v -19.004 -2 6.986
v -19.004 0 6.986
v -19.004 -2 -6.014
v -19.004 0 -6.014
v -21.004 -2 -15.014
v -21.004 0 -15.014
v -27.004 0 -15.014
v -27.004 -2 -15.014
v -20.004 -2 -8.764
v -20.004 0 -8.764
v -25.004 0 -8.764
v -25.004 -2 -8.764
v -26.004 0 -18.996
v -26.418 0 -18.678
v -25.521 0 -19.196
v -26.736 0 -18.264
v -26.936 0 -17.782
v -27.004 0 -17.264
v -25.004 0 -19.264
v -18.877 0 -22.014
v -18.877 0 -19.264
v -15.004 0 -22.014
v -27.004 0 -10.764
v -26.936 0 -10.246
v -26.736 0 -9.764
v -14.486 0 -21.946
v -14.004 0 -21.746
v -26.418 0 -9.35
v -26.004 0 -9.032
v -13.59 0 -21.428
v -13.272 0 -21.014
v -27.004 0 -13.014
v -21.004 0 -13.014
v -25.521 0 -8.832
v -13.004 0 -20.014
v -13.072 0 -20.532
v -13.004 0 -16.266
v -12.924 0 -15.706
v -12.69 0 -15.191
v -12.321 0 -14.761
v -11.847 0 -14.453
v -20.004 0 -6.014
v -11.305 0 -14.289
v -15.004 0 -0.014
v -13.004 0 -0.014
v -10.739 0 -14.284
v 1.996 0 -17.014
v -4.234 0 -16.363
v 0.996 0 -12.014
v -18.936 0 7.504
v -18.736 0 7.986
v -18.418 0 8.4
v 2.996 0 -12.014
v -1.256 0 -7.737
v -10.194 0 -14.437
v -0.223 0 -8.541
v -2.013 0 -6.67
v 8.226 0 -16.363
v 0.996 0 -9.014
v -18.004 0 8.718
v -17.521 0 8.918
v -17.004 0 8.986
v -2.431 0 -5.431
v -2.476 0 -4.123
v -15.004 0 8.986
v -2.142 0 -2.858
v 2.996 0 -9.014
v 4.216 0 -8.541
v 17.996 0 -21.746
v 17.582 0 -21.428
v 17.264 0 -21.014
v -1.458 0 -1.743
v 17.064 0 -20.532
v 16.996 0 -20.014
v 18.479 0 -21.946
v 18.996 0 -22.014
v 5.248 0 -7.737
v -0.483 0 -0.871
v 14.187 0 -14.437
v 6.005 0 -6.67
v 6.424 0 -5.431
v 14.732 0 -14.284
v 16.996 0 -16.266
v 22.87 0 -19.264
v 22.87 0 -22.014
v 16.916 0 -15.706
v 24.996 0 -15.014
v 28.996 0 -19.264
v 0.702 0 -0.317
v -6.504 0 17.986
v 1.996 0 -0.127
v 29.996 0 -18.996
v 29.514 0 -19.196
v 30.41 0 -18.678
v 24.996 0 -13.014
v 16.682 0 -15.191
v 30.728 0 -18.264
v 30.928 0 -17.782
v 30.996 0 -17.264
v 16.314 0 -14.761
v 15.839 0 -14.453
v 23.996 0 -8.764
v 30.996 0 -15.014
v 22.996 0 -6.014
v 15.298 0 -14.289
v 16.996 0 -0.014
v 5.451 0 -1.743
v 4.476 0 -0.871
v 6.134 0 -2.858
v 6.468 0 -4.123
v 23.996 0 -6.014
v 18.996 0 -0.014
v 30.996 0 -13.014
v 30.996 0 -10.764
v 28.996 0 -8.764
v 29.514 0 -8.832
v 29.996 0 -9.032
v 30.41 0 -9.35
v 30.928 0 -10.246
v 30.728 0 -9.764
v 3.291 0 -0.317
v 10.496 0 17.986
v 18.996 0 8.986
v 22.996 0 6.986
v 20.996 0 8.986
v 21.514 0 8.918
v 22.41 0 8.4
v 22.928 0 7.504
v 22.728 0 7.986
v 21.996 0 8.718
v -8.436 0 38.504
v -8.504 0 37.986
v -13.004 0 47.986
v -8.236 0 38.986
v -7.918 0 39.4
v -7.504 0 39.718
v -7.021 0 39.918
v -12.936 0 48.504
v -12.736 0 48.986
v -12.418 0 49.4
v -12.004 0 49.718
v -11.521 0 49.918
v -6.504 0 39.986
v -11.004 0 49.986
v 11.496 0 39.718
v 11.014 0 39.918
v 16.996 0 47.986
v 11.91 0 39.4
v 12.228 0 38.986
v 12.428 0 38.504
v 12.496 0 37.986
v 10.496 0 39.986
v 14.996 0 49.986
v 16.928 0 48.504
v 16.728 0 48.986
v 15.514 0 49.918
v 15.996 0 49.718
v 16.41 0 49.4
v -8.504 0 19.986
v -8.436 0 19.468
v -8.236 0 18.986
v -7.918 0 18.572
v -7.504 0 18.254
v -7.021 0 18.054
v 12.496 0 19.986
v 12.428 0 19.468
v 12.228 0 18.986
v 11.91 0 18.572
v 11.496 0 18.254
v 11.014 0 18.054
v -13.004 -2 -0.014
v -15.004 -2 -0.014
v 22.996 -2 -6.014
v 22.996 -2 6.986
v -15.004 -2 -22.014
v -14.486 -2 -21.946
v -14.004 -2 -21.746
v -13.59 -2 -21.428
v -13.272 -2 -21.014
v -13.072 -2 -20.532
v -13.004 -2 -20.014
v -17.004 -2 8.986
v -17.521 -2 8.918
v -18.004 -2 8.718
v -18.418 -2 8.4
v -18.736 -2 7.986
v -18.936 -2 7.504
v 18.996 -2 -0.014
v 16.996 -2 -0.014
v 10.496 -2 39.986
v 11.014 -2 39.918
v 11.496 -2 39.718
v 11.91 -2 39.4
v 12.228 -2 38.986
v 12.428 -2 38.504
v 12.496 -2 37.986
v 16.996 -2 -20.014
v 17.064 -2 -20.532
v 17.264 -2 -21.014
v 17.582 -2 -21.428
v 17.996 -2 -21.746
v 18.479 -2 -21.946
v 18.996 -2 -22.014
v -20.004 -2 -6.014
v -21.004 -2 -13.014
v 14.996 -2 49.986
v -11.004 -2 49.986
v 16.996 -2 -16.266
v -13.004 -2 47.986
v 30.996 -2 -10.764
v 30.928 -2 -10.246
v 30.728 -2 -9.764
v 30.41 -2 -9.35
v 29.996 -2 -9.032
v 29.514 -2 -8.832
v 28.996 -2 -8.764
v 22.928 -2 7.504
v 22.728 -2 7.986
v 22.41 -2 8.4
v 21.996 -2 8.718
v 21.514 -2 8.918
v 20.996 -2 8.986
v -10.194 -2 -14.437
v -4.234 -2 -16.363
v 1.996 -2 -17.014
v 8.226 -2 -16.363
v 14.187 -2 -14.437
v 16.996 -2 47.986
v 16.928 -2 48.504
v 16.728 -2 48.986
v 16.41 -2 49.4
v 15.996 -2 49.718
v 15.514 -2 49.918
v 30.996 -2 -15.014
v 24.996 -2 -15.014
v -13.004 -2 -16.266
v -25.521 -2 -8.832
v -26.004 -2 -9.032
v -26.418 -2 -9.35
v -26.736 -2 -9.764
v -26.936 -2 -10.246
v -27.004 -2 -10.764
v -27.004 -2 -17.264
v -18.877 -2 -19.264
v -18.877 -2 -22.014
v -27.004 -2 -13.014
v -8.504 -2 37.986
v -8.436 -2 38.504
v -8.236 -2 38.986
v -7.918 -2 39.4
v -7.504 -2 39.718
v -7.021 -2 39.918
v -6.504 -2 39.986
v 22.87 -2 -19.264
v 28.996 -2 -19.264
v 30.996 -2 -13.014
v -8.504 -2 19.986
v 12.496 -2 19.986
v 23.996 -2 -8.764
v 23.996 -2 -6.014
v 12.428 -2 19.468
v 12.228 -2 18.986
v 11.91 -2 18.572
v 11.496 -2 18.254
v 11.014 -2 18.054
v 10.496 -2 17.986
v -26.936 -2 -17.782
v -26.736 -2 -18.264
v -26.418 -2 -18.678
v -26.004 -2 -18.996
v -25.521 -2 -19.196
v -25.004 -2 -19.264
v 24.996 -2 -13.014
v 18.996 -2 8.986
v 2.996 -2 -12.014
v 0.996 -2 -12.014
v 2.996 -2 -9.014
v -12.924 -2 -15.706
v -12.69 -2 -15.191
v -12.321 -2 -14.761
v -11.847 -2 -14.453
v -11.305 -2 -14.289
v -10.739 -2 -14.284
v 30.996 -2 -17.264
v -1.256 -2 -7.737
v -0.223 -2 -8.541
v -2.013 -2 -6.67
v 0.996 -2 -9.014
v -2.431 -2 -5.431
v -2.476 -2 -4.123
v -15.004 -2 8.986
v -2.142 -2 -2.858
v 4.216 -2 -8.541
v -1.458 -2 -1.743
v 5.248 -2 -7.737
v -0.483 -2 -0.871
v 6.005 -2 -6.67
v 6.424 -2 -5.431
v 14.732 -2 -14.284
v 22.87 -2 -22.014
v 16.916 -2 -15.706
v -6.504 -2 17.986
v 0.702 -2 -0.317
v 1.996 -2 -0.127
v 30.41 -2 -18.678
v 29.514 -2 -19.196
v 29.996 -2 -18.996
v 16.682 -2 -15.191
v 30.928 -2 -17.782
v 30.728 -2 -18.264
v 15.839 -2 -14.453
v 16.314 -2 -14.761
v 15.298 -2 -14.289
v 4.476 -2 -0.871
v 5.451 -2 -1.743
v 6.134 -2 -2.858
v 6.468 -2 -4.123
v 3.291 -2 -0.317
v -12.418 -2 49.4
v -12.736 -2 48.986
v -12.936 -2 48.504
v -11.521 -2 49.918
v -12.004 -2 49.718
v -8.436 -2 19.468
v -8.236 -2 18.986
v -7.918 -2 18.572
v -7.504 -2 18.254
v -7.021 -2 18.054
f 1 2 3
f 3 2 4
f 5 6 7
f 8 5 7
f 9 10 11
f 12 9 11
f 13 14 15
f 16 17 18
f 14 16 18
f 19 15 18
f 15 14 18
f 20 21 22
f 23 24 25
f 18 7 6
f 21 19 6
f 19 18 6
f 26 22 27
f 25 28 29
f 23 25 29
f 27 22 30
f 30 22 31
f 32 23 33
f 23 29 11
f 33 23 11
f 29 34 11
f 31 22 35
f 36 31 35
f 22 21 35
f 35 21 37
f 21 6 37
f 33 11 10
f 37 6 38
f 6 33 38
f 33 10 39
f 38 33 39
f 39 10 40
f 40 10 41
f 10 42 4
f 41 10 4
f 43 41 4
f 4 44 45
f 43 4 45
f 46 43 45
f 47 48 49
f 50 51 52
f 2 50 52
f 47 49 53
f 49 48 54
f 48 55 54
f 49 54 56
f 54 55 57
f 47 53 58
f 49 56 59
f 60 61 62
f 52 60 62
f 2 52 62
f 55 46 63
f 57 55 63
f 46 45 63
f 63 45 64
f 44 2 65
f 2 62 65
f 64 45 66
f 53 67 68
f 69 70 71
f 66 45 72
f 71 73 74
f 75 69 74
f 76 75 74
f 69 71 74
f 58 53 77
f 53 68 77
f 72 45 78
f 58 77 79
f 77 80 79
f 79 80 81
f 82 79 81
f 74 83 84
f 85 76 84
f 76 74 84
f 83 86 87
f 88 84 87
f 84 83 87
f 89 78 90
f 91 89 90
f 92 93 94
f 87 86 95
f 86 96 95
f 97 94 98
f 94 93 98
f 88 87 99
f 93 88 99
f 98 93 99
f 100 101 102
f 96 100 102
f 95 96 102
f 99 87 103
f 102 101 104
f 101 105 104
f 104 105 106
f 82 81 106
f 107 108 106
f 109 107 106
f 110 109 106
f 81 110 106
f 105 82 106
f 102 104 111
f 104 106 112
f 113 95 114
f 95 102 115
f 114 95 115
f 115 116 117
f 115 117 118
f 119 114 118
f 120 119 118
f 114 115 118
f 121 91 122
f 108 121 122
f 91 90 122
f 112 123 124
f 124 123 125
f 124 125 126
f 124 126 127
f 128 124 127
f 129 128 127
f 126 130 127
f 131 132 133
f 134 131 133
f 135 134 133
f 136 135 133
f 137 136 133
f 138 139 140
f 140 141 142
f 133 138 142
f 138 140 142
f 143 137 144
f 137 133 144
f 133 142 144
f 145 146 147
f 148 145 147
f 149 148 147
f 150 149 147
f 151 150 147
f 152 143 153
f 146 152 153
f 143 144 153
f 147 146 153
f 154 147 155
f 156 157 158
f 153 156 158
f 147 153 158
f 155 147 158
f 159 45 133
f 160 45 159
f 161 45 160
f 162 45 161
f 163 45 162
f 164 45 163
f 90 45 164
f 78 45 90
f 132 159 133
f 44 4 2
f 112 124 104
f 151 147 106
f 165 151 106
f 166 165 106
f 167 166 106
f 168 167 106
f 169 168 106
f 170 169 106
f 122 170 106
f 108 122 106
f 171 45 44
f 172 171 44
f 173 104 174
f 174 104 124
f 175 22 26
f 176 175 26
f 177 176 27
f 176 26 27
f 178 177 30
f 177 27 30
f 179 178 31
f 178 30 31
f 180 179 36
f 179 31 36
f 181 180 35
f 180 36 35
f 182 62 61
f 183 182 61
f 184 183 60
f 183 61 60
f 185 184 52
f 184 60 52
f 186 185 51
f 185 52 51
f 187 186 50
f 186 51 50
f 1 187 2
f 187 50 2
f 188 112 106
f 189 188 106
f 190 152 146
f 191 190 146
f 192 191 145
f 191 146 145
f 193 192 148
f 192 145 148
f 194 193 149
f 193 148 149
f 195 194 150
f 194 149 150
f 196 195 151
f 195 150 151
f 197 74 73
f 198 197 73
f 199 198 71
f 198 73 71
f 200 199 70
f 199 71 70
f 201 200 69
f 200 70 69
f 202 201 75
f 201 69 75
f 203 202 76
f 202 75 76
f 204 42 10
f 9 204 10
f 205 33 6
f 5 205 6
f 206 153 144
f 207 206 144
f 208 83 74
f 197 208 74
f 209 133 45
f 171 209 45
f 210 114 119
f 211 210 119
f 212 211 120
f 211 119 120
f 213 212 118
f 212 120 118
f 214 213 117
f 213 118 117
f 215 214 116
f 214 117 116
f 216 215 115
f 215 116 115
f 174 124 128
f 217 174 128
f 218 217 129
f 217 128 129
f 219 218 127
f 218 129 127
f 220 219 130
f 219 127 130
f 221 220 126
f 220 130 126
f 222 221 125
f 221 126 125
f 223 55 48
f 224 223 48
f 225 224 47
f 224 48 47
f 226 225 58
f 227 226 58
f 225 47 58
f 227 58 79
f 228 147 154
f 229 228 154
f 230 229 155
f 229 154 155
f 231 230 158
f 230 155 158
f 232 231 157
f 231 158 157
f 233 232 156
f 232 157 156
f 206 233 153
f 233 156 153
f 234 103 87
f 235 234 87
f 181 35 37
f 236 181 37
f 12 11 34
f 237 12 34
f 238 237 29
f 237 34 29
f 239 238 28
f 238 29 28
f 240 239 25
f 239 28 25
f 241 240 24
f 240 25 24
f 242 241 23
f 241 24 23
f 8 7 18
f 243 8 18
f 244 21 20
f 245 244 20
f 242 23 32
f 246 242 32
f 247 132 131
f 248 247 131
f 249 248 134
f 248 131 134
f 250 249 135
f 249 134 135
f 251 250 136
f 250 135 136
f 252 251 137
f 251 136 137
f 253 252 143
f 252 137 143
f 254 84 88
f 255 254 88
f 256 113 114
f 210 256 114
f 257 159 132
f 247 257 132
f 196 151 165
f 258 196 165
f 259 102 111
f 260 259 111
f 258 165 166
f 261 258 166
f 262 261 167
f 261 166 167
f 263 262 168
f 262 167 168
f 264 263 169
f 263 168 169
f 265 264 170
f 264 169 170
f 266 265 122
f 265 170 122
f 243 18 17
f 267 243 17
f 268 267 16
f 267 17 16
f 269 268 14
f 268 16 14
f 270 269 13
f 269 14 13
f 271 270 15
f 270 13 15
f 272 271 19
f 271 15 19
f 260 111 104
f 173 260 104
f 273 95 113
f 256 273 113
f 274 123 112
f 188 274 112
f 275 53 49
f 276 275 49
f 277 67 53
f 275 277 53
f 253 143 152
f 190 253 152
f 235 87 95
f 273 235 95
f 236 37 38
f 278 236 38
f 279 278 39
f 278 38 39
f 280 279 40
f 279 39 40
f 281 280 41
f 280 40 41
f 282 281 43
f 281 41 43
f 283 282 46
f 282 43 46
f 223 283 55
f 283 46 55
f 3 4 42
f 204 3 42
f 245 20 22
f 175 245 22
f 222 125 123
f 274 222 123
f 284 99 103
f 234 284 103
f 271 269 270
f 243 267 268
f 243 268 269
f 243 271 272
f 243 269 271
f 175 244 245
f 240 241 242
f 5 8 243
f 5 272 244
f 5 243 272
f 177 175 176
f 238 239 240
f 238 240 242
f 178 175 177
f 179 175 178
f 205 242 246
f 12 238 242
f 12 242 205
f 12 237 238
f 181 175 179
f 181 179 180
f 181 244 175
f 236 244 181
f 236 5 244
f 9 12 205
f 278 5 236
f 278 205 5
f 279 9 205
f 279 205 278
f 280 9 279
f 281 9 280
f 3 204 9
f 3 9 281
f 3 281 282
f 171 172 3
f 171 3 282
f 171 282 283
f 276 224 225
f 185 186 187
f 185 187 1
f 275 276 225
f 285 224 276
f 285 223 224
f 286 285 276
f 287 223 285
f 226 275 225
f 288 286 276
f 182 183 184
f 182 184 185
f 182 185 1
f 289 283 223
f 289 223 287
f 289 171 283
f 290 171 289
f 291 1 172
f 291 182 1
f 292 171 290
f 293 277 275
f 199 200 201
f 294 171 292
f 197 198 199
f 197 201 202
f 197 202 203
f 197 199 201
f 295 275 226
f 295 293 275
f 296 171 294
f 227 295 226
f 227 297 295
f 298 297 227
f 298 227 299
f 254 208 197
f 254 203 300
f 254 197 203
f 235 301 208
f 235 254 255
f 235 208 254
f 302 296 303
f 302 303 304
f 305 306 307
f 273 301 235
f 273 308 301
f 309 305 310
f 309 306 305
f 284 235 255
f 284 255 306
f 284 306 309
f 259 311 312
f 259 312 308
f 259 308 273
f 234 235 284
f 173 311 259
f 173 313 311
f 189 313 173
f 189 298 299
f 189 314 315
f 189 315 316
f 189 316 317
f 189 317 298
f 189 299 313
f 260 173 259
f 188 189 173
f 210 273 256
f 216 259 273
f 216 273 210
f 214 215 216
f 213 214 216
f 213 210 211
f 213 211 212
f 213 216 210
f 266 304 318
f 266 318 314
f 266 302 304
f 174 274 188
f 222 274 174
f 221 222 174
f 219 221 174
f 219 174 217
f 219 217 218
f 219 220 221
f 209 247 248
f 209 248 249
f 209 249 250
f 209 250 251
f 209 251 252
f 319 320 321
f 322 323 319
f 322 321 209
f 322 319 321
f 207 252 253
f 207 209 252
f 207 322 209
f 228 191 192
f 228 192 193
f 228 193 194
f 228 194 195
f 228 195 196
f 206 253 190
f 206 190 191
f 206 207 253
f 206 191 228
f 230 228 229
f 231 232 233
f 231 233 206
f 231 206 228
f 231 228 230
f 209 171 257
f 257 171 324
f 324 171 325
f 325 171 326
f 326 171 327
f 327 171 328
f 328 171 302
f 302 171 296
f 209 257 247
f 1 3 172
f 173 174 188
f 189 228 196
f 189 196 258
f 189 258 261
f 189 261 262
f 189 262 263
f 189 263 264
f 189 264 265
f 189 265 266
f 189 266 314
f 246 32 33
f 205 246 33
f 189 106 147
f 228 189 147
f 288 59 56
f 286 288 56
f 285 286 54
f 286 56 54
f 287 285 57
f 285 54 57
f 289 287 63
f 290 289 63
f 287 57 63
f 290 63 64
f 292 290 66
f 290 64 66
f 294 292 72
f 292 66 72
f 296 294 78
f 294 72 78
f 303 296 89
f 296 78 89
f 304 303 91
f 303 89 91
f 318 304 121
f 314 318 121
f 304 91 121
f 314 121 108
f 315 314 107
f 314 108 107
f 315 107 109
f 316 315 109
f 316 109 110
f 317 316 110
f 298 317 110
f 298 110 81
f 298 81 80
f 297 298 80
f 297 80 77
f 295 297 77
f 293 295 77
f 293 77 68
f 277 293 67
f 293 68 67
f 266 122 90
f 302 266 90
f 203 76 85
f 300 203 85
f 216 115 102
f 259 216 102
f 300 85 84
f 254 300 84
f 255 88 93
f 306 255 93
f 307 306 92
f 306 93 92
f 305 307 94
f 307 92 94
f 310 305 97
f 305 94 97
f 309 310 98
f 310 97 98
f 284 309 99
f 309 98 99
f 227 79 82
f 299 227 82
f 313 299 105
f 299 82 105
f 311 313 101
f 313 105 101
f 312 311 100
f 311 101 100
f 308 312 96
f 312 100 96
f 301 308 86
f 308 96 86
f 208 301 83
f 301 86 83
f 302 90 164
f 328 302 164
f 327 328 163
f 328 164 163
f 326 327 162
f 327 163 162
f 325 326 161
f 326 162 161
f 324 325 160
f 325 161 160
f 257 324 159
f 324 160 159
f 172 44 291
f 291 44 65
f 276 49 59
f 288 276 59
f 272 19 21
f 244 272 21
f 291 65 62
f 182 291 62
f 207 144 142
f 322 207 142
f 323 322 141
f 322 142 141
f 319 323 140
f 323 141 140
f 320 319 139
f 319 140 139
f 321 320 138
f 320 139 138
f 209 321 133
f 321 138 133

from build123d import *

# Parameters (mm, degrees)
F1_DEPTH = 2


with BuildPart() as f1:
    # F0 (on Front) → F1 (new body)
    with BuildSketch(Plane.XZ):
        with BuildLine():
            Line((-13.003751, 47.985914), (-13.003751, 17.985914))
            Line((-13.003751, 17.985914), (-13.003751, -0.014086))
            Line((-13.003751, -0.014086), (-15.003751, -0.014086))
            Line((-15.003751, -0.014086), (-15.003751, 8.985914))
            Line((-15.003751, 8.985914), (-17.003751, 8.985914))
            ThreePointArc((-17.003751, 8.985914), (-18.417965, 8.400127), (-19.003751, 6.985914))
            Line((-19.003751, 6.985914), (-19.003751, -6.014086))
            Line((-19.003751, -6.014086), (-20.003751, -6.014086))
            Line((-20.003751, -6.014086), (-20.003751, -8.764086))
            Line((-20.003751, -8.764086), (-25.003751, -8.764086))
            ThreePointArc((-25.003751, -8.764086), (-26.417965, -9.349873), (-27.003751, -10.764086))
            Line((-27.003751, -10.764086), (-27.003751, -13.014086))
            Line((-27.003751, -13.014086), (-21.003751, -13.014086))
            Line((-21.003751, -13.014086), (-21.003751, -15.014086))
            Line((-21.003751, -15.014086), (-27.003751, -15.014086))
            Line((-27.003751, -15.014086), (-27.003751, -17.264086))
            ThreePointArc((-27.003751, -17.264086), (-26.417965, -18.6783), (-25.003751, -19.264086))
            Line((-25.003751, -19.264086), (-18.877196, -19.264086))
            Line((-18.877196, -19.264086), (-18.877196, -22.014086))
            Line((-18.877196, -22.014086), (-15.003751, -22.014086))
            ThreePointArc((-15.003751, -22.014086), (-13.589538, -21.4283), (-13.003751, -20.014086))
            Line((-13.003751, -20.014086), (-13.003751, -16.266214))
            ThreePointArc((-13.003751, -16.266214), (-12.094926, -14.590106), (-10.194413, -14.437287))
            ThreePointArc((-10.194413, -14.437287), (1.996249, -17.014086), (14.18691, -14.437287))
            ThreePointArc((14.18691, -14.437287), (16.087423, -14.590106), (16.996249, -16.266214))
            Line((16.996249, -16.266214), (16.996249, -20.014086))
            ThreePointArc((16.996249, -20.014086), (17.582035, -21.4283), (18.996249, -22.014086))
            Line((18.996249, -22.014086), (22.869694, -22.014086))
            Line((22.869694, -22.014086), (22.869694, -19.264086))
            Line((22.869694, -19.264086), (28.996249, -19.264086))
            ThreePointArc((28.996249, -19.264086), (30.410462, -18.6783), (30.996249, -17.264086))
            Line((30.996249, -17.264086), (30.996249, -15.014086))
            Line((30.996249, -15.014086), (24.996249, -15.014086))
            Line((24.996249, -15.014086), (24.996249, -13.014086))
            Line((24.996249, -13.014086), (30.996249, -13.014086))
            Line((30.996249, -13.014086), (30.996249, -10.764086))
            ThreePointArc((30.996249, -10.764086), (30.410462, -9.349873), (28.996249, -8.764086))
            Line((28.996249, -8.764086), (23.996249, -8.764086))
            Line((23.996249, -8.764086), (23.996249, -6.014086))
            Line((23.996249, -6.014086), (22.996249, -6.014086))
            Line((22.996249, -6.014086), (22.996249, 6.985914))
            ThreePointArc((22.996249, 6.985914), (22.410462, 8.400127), (20.996249, 8.985914))
            Line((20.996249, 8.985914), (18.996249, 8.985914))
            Line((18.996249, 8.985914), (18.996249, -0.014086))
            Line((18.996249, -0.014086), (16.996249, -0.014086))
            Line((16.996249, -0.014086), (16.996249, 17.985914))
            Line((16.996249, 17.985914), (16.996249, 47.985914))
            ThreePointArc((16.996249, 47.985914), (16.410462, 49.400127), (14.996249, 49.985914))
            Line((14.996249, 49.985914), (-11.003751, 49.985914))
            ThreePointArc((-11.003751, 49.985914), (-12.417965, 49.400127), (-13.003751, 47.985914))
        make_face()
        with BuildLine():
            Line((2.996249, -12.014086), (0.996249, -12.014086))
            Line((0.996249, -12.014086), (0.996249, -9.014086))
            ThreePointArc((0.996249, -9.014086), (1.996249, -0.126604), (2.996249, -9.014086))
            Line((2.996249, -9.014086), (2.996249, -12.014086))
        make_face(mode=Mode.SUBTRACT)
        with BuildLine():
            ThreePointArc((-8.503751, 37.985914), (-7.917965, 39.400127), (-6.503751, 39.985914))
            Line((-6.503751, 39.985914), (10.496249, 39.985914))
            ThreePointArc((10.496249, 39.985914), (11.910462, 39.400127), (12.496249, 37.985914))
            Line((12.496249, 37.985914), (12.496249, 19.985914))
            ThreePointArc((12.496249, 19.985914), (11.910462, 18.5717), (10.496249, 17.985914))
            Line((10.496249, 17.985914), (-6.503751, 17.985914))
            ThreePointArc((-6.503751, 17.985914), (-7.917965, 18.5717), (-8.503751, 19.985914))
            Line((-8.503751, 19.985914), (-8.503751, 37.985914))
        make_face(mode=Mode.SUBTRACT)
    extrude(amount=F1_DEPTH)


solid = f1.part
